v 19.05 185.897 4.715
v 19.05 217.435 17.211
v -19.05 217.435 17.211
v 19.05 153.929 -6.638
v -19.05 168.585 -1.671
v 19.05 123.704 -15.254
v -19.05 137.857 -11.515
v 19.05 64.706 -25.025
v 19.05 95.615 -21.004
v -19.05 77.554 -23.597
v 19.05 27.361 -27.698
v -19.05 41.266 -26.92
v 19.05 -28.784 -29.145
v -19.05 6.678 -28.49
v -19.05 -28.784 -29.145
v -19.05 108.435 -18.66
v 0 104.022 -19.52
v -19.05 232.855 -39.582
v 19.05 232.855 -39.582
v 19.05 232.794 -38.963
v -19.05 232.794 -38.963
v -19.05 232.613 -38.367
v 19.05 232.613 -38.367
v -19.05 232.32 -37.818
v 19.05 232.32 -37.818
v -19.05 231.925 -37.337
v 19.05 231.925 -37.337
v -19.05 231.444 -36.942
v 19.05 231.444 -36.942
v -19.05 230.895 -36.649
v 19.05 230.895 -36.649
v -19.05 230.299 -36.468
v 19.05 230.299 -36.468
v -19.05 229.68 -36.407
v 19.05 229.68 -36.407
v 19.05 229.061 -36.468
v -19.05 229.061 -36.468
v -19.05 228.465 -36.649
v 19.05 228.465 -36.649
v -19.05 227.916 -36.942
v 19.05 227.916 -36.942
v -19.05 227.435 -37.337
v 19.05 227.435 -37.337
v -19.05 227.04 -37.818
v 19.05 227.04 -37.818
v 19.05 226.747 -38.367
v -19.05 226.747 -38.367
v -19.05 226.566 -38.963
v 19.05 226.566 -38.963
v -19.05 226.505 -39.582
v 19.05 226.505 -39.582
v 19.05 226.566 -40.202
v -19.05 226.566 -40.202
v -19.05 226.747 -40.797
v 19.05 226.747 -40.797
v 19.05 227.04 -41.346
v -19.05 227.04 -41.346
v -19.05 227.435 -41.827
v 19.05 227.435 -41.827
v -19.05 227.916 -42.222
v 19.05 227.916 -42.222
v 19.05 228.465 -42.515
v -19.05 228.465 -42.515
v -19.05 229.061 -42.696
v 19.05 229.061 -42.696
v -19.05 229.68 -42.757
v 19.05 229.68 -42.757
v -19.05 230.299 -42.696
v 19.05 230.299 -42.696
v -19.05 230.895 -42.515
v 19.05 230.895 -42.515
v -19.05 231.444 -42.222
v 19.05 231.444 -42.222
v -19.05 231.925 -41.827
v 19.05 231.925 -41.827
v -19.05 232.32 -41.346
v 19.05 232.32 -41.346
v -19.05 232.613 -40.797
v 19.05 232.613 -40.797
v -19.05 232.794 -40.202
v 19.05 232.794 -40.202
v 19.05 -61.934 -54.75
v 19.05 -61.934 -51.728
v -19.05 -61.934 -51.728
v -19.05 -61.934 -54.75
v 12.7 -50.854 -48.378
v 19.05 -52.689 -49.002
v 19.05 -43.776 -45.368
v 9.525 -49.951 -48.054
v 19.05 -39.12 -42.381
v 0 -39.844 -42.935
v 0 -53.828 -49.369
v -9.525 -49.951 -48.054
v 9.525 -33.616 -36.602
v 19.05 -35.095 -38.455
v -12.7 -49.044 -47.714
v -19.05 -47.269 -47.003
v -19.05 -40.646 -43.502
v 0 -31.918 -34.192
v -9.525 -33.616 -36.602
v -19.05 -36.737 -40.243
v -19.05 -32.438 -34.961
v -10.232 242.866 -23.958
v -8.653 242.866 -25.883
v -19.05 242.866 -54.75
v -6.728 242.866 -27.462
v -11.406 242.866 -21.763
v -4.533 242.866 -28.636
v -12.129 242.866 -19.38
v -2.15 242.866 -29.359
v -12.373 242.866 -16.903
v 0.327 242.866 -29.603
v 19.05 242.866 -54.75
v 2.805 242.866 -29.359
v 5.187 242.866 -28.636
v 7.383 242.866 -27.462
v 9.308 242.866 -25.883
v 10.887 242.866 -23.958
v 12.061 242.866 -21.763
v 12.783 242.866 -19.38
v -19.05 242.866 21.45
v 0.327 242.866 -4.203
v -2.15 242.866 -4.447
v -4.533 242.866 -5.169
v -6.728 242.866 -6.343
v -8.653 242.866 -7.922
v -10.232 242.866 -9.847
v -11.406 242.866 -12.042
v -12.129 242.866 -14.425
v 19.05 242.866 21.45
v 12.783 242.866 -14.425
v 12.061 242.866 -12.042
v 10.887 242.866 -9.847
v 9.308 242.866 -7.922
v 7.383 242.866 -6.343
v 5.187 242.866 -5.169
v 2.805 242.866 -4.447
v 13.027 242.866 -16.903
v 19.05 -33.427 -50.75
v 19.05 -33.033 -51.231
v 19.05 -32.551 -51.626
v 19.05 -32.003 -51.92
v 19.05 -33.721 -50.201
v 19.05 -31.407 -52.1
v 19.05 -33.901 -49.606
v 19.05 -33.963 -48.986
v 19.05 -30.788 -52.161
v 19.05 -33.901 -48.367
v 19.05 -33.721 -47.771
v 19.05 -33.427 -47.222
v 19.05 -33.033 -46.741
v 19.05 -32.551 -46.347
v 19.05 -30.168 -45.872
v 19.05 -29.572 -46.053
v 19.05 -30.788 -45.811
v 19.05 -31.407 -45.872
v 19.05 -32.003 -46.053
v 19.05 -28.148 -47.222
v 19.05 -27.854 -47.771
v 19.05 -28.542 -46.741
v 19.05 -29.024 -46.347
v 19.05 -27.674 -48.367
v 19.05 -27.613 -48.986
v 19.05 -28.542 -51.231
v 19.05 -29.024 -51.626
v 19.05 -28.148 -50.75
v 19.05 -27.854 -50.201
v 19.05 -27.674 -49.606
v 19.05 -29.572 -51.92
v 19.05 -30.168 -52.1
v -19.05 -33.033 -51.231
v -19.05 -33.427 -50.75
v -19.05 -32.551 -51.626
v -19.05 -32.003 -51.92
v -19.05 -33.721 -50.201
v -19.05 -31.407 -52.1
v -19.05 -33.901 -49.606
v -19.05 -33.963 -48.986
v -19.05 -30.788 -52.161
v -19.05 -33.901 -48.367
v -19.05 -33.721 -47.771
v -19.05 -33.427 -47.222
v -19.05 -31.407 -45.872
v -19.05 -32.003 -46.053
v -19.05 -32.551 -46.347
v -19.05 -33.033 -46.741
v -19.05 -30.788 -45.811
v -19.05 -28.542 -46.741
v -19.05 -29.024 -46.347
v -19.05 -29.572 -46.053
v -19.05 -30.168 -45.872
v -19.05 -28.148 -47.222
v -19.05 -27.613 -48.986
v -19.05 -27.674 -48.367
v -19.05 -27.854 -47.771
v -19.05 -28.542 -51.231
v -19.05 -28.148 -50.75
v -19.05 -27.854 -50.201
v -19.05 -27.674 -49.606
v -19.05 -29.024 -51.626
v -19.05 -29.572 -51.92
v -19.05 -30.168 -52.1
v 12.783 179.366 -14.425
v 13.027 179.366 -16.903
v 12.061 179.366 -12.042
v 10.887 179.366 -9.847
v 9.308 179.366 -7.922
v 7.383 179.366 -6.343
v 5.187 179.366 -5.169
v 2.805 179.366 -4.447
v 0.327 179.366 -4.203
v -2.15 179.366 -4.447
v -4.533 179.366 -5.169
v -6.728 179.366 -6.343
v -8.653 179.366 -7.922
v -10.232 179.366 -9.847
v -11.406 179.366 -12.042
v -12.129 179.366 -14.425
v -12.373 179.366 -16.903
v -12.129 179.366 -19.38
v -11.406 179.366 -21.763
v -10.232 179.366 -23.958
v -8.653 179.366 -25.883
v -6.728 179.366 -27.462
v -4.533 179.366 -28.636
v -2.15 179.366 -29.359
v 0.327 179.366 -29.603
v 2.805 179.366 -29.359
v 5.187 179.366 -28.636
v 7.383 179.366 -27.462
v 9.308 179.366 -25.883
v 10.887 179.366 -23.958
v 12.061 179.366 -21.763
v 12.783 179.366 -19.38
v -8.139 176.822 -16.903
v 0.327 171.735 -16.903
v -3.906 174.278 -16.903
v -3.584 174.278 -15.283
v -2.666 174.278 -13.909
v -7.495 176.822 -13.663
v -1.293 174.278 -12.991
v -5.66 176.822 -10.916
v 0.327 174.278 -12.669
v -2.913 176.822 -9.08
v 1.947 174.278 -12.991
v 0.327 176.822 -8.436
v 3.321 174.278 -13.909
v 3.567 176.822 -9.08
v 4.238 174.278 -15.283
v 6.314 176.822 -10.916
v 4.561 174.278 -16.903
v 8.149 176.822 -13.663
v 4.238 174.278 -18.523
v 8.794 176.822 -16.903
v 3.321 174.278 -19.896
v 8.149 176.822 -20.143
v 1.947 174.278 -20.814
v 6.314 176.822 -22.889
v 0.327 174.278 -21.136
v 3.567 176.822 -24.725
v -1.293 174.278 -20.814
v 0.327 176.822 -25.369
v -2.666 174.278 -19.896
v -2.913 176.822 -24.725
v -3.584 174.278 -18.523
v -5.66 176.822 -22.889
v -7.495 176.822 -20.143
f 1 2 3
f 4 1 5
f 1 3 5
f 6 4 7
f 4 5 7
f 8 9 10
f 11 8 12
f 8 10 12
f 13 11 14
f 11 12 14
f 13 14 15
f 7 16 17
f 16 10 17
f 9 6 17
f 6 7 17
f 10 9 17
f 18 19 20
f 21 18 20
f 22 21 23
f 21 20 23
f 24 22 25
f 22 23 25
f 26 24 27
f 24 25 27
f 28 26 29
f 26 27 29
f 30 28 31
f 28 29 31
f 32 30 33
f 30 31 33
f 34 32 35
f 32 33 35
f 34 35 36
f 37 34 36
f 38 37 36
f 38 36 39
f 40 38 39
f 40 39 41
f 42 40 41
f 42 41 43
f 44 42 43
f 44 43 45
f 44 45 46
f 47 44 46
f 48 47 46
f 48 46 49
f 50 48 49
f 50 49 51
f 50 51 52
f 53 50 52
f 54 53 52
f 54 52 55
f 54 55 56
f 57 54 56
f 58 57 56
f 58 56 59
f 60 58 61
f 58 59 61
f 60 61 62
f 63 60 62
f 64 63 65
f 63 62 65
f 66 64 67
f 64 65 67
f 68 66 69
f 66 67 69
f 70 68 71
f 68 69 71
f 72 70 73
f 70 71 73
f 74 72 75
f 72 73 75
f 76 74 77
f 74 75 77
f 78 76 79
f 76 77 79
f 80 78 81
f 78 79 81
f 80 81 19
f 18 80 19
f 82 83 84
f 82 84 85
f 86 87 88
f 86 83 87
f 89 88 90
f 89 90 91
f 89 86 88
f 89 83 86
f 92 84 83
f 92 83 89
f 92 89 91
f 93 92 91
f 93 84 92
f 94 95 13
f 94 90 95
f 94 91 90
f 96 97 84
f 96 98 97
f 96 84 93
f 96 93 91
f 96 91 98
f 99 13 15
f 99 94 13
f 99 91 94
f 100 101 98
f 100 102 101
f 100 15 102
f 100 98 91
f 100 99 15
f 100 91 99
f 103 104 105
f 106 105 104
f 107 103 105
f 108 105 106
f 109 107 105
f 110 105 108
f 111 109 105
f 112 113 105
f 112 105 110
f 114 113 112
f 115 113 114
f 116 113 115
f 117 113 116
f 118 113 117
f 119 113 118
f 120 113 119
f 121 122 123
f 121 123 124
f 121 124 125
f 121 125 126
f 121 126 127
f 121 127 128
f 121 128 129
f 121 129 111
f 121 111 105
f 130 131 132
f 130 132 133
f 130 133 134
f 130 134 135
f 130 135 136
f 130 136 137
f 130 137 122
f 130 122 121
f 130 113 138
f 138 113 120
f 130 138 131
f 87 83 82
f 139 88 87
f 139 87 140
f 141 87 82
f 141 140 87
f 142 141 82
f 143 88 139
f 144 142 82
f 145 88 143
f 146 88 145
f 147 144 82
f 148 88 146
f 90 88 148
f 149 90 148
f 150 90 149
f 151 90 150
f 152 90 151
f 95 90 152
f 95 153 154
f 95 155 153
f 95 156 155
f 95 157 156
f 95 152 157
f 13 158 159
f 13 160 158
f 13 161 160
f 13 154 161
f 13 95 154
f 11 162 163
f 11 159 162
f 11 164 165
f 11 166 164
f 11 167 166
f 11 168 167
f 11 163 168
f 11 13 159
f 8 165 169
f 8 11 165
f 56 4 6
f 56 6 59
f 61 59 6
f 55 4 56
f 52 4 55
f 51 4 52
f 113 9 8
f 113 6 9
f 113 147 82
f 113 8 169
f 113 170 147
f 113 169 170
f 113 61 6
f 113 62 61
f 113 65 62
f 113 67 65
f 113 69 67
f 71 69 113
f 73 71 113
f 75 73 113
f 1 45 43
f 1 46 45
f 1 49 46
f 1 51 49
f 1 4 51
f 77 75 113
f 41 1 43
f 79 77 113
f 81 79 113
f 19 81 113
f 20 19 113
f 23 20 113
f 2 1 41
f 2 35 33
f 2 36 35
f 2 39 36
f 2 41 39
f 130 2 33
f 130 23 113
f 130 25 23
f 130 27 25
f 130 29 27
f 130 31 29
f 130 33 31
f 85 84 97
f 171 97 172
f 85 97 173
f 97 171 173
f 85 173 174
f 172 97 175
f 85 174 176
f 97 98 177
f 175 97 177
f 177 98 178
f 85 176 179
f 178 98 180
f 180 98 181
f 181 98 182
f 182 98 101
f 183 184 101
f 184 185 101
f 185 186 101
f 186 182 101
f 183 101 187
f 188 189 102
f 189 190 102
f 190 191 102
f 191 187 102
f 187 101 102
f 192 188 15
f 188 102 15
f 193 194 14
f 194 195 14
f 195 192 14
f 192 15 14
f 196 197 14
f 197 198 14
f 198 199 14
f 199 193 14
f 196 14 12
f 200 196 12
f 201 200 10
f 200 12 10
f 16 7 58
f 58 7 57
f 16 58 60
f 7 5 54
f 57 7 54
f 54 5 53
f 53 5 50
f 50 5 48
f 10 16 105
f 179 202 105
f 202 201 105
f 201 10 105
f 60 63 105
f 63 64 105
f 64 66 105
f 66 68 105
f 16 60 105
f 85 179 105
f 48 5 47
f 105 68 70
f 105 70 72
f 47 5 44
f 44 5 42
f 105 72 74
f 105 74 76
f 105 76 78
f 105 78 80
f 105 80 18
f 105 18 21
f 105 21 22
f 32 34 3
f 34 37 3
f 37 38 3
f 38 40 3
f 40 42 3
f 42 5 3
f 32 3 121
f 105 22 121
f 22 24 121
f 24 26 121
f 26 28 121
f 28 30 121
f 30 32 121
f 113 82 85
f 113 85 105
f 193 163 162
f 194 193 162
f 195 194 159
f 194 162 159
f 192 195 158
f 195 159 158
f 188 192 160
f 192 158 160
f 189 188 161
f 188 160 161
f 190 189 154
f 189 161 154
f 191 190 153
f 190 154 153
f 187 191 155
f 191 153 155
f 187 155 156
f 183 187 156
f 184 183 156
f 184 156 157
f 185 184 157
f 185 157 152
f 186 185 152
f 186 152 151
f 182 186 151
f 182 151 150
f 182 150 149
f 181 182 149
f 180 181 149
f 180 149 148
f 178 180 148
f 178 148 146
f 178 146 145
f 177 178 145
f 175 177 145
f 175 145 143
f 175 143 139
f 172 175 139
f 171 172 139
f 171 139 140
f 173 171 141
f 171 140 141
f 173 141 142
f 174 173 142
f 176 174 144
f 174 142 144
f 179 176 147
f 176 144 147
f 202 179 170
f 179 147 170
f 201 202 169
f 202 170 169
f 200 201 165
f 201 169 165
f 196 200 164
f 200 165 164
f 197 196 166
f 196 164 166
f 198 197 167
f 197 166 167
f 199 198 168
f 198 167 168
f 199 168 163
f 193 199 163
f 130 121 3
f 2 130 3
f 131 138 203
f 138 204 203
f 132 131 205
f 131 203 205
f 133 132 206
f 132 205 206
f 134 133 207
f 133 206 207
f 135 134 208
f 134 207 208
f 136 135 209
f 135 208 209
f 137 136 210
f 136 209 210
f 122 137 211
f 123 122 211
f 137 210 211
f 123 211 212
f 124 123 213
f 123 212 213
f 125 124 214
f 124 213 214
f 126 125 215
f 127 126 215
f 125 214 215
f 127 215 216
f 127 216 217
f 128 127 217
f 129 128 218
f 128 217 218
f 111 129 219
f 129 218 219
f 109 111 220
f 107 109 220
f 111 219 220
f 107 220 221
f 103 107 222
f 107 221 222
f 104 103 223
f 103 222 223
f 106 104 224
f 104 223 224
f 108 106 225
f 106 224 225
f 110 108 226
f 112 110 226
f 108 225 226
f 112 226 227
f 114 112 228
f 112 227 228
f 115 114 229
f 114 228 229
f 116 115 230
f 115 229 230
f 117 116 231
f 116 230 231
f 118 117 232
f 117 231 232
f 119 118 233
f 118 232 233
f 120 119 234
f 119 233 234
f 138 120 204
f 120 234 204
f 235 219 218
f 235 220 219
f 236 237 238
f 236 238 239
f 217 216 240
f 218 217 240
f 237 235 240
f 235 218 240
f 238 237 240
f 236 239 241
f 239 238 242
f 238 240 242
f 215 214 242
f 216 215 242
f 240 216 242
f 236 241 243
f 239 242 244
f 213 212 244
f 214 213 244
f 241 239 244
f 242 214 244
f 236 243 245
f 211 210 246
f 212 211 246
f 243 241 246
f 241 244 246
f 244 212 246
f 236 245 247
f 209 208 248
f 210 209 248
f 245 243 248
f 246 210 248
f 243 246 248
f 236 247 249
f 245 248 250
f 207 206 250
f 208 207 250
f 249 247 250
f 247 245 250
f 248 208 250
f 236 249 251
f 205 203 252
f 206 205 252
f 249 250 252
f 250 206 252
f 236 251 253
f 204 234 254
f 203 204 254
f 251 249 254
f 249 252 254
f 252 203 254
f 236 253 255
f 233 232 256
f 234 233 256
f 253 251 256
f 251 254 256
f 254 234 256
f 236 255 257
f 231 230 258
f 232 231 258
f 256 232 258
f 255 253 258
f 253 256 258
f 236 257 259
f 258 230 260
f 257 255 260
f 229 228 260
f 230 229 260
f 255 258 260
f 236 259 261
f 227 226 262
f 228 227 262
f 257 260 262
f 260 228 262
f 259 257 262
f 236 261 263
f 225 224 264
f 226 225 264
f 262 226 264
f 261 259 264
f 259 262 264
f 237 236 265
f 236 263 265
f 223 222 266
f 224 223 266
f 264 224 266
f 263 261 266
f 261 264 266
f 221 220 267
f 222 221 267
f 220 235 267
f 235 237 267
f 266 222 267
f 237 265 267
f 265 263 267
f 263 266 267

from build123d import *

# Parameters (mm, degrees)
F1_DEPTH = 19.05
F3_D     = 25.4
F3_DEPTH = 63.5
F3_TIP   = 7.6309298617
F5_DEPTH = 50.4981949925
F7_DEPTH = 40.6211540103
F9_D     = 6.35
F11_D    = 6.35


with BuildPart() as f1:
    # F0 (on Right) → F1 (new body, symmetric)
    with BuildSketch(Plane.YZ):
        Polygon((242.8656616081, 21.4498834579), (-61.9343383919, -29.3501165421), (-61.9343383919, -54.7501165421), (242.8656616081, -54.7501165421), align=None)
    extrude(amount=F1_DEPTH, both=True)

    # F3
    with Locations(Plane(origin=(0, 242.8656616081, 0), x_dir=(-1, 0, 0), z_dir=(0, 1, 0))):
        with Locations((-0.3272963222, -16.9025734067)):
            Hole(F3_D / 2, depth=F3_DEPTH)
            with Locations((0, 0, -(F3_DEPTH + F3_TIP / 2))):  # 118° drill point
                Cone(0, F3_D / 2, F3_TIP, mode=Mode.SUBTRACT)

    # F4 (on face) → F5 (cut)
    with BuildSketch(Plane(origin=(-19.05, 0, 0), x_dir=(0, -1, 0), z_dir=(-1, 0, 0))):
        with BuildLine():
            Line((61.9343383919, -29.3501165421), (-217.434808525, 17.2114079441))
            add(Edge.make_bspline(
                [(-217.434808525, 17.2114079441), (-181.7031574212, 2.796838546), (-103.7756395376, -28.6400418614), (3.7252200382, -29.1006886434), (61.9343383919, -29.3501165421)],
                knots=[0, 0, 0, 0, 0.4585241666, 1, 1, 1, 1], degree=3))
        make_face()
    extrude(amount=-F5_DEPTH, mode=Mode.SUBTRACT)

    # F6 (on face) → F7 (cut)
    with BuildSketch(Plane(origin=(-19.05, 0, 0), x_dir=(0, -1, 0), z_dir=(-1, 0, 0))):
        with BuildLine():
            add(Edge.make_bspline(
                [(61.9343383919, -51.728207618), (53.7275699574, -49.4475771186), (38.4988179682, -45.1515261487), (31.8427817105, -34.270455265), (28.7836416426, -29.1453393273)],
                knots=[0, 0, 0, 0, 0.5369777676, 1, 1, 1, 1], degree=3))
            Line((61.9343383919, -51.728207618), (61.9343383919, -29.3501165421))
            add(Edge.make_bspline(
                [(28.7836416426, -29.1453393273), (39.7941135042, -29.2552449401), (50.8642259332, -29.3026807628), (61.9343383919, -29.3501165421)],
                knots=[0.8970230345, 0.8970230345, 0.8970230345, 0.8970230345, 1, 1, 1, 1], degree=3))
        make_face()
    extrude(amount=-F7_DEPTH, mode=Mode.SUBTRACT)

    # F9 (through all)
    with Locations(Plane(origin=(-19.05, 0, 0), x_dir=(0, -1, 0), z_dir=(-1, 0, 0))):
        with Locations((30.7875052094, -48.9864274859)):
            Hole(F9_D / 2)

    # F11 (through all)
    with Locations(Plane(origin=(-19.05, 0, 0), x_dir=(0, -1, 0), z_dir=(-1, 0, 0))):
        with Locations((-229.6800166368, -39.5821034908)):
            Hole(F11_D / 2)


solid = f1.part
